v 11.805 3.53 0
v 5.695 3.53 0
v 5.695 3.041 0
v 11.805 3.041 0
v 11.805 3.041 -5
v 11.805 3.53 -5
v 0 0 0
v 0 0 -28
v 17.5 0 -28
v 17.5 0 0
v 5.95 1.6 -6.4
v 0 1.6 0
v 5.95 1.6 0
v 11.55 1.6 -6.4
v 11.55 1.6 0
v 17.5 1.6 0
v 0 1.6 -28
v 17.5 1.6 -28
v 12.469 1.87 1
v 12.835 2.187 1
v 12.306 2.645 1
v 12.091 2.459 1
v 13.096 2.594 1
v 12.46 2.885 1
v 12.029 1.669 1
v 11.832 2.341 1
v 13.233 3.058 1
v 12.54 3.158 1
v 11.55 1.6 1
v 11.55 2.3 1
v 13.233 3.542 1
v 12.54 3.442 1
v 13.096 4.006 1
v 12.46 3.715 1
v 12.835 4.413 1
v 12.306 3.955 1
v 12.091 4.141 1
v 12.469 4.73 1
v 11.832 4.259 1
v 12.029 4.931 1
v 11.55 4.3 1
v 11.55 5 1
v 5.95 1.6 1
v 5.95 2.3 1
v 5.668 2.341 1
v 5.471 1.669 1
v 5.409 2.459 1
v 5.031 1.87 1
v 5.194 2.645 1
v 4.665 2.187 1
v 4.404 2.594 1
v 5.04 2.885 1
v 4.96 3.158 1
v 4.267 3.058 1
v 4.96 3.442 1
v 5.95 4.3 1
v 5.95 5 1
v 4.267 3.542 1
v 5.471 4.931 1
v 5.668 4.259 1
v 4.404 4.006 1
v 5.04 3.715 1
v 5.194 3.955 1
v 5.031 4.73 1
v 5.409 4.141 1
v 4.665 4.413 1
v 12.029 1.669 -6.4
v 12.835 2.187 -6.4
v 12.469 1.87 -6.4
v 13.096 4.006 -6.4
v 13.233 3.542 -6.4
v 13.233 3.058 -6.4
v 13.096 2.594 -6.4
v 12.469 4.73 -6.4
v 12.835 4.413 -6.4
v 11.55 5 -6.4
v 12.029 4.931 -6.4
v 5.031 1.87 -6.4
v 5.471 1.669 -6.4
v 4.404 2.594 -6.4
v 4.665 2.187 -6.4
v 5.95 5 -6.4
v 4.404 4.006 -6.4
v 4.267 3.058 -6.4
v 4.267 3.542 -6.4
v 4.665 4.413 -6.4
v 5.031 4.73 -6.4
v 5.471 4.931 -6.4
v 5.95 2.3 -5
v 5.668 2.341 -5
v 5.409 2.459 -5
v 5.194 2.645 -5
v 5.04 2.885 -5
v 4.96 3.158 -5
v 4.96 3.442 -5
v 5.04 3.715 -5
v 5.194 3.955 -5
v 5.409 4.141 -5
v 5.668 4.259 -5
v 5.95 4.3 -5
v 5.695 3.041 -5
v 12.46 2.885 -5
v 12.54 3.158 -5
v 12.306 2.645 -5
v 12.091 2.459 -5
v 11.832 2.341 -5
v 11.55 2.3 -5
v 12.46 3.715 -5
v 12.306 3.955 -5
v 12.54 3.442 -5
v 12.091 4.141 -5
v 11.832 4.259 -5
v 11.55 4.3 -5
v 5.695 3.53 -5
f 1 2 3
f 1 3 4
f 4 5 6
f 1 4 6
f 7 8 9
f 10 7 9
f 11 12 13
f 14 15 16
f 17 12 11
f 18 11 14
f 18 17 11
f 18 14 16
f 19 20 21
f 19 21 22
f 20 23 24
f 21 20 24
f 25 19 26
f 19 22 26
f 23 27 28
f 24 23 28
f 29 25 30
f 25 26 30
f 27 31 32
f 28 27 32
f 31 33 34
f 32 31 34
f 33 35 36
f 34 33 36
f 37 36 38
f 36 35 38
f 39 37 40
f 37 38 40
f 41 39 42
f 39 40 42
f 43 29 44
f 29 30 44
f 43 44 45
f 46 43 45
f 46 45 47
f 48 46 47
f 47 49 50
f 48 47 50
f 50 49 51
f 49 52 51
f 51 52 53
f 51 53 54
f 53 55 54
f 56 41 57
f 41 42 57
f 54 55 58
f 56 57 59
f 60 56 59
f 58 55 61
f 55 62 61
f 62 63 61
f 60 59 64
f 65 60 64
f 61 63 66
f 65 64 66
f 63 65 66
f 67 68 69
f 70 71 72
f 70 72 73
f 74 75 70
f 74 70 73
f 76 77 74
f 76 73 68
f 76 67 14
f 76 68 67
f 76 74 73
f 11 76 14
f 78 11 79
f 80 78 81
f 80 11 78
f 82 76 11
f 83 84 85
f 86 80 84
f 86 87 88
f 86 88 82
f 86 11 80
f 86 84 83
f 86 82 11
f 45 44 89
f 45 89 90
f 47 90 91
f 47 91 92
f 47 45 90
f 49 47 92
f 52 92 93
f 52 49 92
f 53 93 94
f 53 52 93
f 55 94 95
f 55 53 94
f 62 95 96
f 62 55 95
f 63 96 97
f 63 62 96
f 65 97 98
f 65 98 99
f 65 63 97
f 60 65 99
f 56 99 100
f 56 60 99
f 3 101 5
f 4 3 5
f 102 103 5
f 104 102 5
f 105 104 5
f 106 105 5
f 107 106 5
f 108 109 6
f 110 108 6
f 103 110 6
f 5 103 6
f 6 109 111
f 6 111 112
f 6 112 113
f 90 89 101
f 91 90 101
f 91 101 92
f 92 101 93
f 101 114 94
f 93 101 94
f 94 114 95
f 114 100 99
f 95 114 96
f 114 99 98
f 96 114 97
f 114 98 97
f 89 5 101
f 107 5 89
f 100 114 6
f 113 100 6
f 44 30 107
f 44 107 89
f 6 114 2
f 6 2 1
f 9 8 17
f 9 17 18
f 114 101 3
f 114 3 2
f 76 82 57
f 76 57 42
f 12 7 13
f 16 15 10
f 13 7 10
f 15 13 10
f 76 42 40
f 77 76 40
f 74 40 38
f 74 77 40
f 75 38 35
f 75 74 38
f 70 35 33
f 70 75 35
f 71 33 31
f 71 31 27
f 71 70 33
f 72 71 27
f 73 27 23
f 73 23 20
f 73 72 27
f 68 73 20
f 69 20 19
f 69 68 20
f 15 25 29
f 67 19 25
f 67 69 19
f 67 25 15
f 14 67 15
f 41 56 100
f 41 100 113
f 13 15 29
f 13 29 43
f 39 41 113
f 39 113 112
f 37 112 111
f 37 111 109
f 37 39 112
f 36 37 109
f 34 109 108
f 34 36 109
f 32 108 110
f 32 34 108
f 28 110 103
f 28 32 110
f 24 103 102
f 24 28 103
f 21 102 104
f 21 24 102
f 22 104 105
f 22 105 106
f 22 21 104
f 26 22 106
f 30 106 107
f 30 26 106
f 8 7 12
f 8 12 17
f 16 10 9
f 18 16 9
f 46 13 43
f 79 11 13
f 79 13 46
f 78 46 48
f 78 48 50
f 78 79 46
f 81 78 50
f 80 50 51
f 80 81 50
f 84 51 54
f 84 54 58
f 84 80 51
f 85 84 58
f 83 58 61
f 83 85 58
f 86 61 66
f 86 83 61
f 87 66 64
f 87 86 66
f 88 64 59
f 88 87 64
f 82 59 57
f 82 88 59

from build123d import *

# Parameters (mm, degrees)
SKETCH1_W                = 17.5
SKETCH1_H                = 28
BOSS_EXTRUDE1_DEPTH      = 1.6
BOSS_EXTRUDE2_DEPTH      = 1
BOSS_EXTRUDE2_DEPTH_BACK = 6.4
CUT_EXTRUDE1_DEPTH       = 6
SKETCH4_W                = 6.110016504
SKETCH4_H                = 0.488801321
BOSS_EXTRUDE3_DEPTH      = 5


with BuildPart() as part:
    # Sketch1 → Boss-Extrude1 (new body)
    with BuildSketch(Plane(origin=(0, 0, 0), x_dir=(1, 0, 0), z_dir=(0, 1, 0))):
        with Locations((8.75, 14)):
            Rectangle(SKETCH1_W, SKETCH1_H)
    extrude(amount=BOSS_EXTRUDE1_DEPTH)

    # Sketch2 → Boss-Extrude2 (add, two sides: drawn at the far end of the back side and taken through both)
    with BuildSketch(Plane.XY.offset(-BOSS_EXTRUDE2_DEPTH_BACK)):
        with BuildLine():
            Line((5.95, 5), (11.55, 5))
            ThreePointArc((11.55, 5), (13.25, 3.3), (11.55, 1.6))
            Line((11.55, 1.6), (5.95, 1.6))
            ThreePointArc((5.95, 1.6), (4.25, 3.3), (5.95, 5))
        make_face()
    extrude(amount=BOSS_EXTRUDE2_DEPTH + BOSS_EXTRUDE2_DEPTH_BACK)

    # Sketch3 → Cut-Extrude1 (cut)
    with BuildSketch(Plane.XY.offset(1)):
        with BuildLine():
            Line((11.55, 2.3), (5.95, 2.3))
            ThreePointArc((5.95, 2.3), (4.95, 3.3), (5.95, 4.3))
            Line((5.95, 4.3), (11.55, 4.3))
            ThreePointArc((11.55, 4.3), (12.55, 3.3), (11.55, 2.3))
        make_face()
    extrude(amount=-CUT_EXTRUDE1_DEPTH, mode=Mode.SUBTRACT)

    # Sketch4 → Boss-Extrude3 (add)
    with BuildSketch(Plane.XY.offset(-5)):
        with Locations((8.750272331, 3.285790187)):
            Rectangle(SKETCH4_W, SKETCH4_H)
    extrude(amount=BOSS_EXTRUDE3_DEPTH)


solid = part.part
